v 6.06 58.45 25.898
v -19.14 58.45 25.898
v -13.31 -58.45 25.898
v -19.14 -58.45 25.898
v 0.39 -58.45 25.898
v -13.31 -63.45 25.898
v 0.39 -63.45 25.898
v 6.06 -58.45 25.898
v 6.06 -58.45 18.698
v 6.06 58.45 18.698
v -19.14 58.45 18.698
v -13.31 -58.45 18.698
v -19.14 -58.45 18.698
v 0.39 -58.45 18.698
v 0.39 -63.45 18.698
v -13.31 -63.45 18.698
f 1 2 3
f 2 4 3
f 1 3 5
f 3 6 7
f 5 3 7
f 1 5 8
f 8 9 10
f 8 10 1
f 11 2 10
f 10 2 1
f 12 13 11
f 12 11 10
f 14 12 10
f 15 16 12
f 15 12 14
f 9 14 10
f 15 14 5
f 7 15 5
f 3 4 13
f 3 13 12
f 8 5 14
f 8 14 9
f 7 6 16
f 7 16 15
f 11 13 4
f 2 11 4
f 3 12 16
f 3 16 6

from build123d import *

# Parameters (mm, degrees)
F0_W     = 25.2
F0_H     = 7.2
F1_DEPTH = 58.45
F2_W     = 13.700049
F2_H     = 7.2
F3_DEPTH = 5


with BuildPart() as f1:
    # F0 (on Front) → F1 (new body, symmetric)
    with BuildSketch(Plane.XZ):
        with Locations((-6.539625, 22.297869)):
            Rectangle(F0_W, F0_H)
    extrude(amount=F1_DEPTH, both=True)

    # F2 (on face) → F3 (join)
    with BuildSketch(Plane.XZ.offset(58.45)):
        with Locations((-6.460382, 22.297869)):
            Rectangle(F2_W, F2_H)
    extrude(amount=F3_DEPTH)


solid = f1.part
